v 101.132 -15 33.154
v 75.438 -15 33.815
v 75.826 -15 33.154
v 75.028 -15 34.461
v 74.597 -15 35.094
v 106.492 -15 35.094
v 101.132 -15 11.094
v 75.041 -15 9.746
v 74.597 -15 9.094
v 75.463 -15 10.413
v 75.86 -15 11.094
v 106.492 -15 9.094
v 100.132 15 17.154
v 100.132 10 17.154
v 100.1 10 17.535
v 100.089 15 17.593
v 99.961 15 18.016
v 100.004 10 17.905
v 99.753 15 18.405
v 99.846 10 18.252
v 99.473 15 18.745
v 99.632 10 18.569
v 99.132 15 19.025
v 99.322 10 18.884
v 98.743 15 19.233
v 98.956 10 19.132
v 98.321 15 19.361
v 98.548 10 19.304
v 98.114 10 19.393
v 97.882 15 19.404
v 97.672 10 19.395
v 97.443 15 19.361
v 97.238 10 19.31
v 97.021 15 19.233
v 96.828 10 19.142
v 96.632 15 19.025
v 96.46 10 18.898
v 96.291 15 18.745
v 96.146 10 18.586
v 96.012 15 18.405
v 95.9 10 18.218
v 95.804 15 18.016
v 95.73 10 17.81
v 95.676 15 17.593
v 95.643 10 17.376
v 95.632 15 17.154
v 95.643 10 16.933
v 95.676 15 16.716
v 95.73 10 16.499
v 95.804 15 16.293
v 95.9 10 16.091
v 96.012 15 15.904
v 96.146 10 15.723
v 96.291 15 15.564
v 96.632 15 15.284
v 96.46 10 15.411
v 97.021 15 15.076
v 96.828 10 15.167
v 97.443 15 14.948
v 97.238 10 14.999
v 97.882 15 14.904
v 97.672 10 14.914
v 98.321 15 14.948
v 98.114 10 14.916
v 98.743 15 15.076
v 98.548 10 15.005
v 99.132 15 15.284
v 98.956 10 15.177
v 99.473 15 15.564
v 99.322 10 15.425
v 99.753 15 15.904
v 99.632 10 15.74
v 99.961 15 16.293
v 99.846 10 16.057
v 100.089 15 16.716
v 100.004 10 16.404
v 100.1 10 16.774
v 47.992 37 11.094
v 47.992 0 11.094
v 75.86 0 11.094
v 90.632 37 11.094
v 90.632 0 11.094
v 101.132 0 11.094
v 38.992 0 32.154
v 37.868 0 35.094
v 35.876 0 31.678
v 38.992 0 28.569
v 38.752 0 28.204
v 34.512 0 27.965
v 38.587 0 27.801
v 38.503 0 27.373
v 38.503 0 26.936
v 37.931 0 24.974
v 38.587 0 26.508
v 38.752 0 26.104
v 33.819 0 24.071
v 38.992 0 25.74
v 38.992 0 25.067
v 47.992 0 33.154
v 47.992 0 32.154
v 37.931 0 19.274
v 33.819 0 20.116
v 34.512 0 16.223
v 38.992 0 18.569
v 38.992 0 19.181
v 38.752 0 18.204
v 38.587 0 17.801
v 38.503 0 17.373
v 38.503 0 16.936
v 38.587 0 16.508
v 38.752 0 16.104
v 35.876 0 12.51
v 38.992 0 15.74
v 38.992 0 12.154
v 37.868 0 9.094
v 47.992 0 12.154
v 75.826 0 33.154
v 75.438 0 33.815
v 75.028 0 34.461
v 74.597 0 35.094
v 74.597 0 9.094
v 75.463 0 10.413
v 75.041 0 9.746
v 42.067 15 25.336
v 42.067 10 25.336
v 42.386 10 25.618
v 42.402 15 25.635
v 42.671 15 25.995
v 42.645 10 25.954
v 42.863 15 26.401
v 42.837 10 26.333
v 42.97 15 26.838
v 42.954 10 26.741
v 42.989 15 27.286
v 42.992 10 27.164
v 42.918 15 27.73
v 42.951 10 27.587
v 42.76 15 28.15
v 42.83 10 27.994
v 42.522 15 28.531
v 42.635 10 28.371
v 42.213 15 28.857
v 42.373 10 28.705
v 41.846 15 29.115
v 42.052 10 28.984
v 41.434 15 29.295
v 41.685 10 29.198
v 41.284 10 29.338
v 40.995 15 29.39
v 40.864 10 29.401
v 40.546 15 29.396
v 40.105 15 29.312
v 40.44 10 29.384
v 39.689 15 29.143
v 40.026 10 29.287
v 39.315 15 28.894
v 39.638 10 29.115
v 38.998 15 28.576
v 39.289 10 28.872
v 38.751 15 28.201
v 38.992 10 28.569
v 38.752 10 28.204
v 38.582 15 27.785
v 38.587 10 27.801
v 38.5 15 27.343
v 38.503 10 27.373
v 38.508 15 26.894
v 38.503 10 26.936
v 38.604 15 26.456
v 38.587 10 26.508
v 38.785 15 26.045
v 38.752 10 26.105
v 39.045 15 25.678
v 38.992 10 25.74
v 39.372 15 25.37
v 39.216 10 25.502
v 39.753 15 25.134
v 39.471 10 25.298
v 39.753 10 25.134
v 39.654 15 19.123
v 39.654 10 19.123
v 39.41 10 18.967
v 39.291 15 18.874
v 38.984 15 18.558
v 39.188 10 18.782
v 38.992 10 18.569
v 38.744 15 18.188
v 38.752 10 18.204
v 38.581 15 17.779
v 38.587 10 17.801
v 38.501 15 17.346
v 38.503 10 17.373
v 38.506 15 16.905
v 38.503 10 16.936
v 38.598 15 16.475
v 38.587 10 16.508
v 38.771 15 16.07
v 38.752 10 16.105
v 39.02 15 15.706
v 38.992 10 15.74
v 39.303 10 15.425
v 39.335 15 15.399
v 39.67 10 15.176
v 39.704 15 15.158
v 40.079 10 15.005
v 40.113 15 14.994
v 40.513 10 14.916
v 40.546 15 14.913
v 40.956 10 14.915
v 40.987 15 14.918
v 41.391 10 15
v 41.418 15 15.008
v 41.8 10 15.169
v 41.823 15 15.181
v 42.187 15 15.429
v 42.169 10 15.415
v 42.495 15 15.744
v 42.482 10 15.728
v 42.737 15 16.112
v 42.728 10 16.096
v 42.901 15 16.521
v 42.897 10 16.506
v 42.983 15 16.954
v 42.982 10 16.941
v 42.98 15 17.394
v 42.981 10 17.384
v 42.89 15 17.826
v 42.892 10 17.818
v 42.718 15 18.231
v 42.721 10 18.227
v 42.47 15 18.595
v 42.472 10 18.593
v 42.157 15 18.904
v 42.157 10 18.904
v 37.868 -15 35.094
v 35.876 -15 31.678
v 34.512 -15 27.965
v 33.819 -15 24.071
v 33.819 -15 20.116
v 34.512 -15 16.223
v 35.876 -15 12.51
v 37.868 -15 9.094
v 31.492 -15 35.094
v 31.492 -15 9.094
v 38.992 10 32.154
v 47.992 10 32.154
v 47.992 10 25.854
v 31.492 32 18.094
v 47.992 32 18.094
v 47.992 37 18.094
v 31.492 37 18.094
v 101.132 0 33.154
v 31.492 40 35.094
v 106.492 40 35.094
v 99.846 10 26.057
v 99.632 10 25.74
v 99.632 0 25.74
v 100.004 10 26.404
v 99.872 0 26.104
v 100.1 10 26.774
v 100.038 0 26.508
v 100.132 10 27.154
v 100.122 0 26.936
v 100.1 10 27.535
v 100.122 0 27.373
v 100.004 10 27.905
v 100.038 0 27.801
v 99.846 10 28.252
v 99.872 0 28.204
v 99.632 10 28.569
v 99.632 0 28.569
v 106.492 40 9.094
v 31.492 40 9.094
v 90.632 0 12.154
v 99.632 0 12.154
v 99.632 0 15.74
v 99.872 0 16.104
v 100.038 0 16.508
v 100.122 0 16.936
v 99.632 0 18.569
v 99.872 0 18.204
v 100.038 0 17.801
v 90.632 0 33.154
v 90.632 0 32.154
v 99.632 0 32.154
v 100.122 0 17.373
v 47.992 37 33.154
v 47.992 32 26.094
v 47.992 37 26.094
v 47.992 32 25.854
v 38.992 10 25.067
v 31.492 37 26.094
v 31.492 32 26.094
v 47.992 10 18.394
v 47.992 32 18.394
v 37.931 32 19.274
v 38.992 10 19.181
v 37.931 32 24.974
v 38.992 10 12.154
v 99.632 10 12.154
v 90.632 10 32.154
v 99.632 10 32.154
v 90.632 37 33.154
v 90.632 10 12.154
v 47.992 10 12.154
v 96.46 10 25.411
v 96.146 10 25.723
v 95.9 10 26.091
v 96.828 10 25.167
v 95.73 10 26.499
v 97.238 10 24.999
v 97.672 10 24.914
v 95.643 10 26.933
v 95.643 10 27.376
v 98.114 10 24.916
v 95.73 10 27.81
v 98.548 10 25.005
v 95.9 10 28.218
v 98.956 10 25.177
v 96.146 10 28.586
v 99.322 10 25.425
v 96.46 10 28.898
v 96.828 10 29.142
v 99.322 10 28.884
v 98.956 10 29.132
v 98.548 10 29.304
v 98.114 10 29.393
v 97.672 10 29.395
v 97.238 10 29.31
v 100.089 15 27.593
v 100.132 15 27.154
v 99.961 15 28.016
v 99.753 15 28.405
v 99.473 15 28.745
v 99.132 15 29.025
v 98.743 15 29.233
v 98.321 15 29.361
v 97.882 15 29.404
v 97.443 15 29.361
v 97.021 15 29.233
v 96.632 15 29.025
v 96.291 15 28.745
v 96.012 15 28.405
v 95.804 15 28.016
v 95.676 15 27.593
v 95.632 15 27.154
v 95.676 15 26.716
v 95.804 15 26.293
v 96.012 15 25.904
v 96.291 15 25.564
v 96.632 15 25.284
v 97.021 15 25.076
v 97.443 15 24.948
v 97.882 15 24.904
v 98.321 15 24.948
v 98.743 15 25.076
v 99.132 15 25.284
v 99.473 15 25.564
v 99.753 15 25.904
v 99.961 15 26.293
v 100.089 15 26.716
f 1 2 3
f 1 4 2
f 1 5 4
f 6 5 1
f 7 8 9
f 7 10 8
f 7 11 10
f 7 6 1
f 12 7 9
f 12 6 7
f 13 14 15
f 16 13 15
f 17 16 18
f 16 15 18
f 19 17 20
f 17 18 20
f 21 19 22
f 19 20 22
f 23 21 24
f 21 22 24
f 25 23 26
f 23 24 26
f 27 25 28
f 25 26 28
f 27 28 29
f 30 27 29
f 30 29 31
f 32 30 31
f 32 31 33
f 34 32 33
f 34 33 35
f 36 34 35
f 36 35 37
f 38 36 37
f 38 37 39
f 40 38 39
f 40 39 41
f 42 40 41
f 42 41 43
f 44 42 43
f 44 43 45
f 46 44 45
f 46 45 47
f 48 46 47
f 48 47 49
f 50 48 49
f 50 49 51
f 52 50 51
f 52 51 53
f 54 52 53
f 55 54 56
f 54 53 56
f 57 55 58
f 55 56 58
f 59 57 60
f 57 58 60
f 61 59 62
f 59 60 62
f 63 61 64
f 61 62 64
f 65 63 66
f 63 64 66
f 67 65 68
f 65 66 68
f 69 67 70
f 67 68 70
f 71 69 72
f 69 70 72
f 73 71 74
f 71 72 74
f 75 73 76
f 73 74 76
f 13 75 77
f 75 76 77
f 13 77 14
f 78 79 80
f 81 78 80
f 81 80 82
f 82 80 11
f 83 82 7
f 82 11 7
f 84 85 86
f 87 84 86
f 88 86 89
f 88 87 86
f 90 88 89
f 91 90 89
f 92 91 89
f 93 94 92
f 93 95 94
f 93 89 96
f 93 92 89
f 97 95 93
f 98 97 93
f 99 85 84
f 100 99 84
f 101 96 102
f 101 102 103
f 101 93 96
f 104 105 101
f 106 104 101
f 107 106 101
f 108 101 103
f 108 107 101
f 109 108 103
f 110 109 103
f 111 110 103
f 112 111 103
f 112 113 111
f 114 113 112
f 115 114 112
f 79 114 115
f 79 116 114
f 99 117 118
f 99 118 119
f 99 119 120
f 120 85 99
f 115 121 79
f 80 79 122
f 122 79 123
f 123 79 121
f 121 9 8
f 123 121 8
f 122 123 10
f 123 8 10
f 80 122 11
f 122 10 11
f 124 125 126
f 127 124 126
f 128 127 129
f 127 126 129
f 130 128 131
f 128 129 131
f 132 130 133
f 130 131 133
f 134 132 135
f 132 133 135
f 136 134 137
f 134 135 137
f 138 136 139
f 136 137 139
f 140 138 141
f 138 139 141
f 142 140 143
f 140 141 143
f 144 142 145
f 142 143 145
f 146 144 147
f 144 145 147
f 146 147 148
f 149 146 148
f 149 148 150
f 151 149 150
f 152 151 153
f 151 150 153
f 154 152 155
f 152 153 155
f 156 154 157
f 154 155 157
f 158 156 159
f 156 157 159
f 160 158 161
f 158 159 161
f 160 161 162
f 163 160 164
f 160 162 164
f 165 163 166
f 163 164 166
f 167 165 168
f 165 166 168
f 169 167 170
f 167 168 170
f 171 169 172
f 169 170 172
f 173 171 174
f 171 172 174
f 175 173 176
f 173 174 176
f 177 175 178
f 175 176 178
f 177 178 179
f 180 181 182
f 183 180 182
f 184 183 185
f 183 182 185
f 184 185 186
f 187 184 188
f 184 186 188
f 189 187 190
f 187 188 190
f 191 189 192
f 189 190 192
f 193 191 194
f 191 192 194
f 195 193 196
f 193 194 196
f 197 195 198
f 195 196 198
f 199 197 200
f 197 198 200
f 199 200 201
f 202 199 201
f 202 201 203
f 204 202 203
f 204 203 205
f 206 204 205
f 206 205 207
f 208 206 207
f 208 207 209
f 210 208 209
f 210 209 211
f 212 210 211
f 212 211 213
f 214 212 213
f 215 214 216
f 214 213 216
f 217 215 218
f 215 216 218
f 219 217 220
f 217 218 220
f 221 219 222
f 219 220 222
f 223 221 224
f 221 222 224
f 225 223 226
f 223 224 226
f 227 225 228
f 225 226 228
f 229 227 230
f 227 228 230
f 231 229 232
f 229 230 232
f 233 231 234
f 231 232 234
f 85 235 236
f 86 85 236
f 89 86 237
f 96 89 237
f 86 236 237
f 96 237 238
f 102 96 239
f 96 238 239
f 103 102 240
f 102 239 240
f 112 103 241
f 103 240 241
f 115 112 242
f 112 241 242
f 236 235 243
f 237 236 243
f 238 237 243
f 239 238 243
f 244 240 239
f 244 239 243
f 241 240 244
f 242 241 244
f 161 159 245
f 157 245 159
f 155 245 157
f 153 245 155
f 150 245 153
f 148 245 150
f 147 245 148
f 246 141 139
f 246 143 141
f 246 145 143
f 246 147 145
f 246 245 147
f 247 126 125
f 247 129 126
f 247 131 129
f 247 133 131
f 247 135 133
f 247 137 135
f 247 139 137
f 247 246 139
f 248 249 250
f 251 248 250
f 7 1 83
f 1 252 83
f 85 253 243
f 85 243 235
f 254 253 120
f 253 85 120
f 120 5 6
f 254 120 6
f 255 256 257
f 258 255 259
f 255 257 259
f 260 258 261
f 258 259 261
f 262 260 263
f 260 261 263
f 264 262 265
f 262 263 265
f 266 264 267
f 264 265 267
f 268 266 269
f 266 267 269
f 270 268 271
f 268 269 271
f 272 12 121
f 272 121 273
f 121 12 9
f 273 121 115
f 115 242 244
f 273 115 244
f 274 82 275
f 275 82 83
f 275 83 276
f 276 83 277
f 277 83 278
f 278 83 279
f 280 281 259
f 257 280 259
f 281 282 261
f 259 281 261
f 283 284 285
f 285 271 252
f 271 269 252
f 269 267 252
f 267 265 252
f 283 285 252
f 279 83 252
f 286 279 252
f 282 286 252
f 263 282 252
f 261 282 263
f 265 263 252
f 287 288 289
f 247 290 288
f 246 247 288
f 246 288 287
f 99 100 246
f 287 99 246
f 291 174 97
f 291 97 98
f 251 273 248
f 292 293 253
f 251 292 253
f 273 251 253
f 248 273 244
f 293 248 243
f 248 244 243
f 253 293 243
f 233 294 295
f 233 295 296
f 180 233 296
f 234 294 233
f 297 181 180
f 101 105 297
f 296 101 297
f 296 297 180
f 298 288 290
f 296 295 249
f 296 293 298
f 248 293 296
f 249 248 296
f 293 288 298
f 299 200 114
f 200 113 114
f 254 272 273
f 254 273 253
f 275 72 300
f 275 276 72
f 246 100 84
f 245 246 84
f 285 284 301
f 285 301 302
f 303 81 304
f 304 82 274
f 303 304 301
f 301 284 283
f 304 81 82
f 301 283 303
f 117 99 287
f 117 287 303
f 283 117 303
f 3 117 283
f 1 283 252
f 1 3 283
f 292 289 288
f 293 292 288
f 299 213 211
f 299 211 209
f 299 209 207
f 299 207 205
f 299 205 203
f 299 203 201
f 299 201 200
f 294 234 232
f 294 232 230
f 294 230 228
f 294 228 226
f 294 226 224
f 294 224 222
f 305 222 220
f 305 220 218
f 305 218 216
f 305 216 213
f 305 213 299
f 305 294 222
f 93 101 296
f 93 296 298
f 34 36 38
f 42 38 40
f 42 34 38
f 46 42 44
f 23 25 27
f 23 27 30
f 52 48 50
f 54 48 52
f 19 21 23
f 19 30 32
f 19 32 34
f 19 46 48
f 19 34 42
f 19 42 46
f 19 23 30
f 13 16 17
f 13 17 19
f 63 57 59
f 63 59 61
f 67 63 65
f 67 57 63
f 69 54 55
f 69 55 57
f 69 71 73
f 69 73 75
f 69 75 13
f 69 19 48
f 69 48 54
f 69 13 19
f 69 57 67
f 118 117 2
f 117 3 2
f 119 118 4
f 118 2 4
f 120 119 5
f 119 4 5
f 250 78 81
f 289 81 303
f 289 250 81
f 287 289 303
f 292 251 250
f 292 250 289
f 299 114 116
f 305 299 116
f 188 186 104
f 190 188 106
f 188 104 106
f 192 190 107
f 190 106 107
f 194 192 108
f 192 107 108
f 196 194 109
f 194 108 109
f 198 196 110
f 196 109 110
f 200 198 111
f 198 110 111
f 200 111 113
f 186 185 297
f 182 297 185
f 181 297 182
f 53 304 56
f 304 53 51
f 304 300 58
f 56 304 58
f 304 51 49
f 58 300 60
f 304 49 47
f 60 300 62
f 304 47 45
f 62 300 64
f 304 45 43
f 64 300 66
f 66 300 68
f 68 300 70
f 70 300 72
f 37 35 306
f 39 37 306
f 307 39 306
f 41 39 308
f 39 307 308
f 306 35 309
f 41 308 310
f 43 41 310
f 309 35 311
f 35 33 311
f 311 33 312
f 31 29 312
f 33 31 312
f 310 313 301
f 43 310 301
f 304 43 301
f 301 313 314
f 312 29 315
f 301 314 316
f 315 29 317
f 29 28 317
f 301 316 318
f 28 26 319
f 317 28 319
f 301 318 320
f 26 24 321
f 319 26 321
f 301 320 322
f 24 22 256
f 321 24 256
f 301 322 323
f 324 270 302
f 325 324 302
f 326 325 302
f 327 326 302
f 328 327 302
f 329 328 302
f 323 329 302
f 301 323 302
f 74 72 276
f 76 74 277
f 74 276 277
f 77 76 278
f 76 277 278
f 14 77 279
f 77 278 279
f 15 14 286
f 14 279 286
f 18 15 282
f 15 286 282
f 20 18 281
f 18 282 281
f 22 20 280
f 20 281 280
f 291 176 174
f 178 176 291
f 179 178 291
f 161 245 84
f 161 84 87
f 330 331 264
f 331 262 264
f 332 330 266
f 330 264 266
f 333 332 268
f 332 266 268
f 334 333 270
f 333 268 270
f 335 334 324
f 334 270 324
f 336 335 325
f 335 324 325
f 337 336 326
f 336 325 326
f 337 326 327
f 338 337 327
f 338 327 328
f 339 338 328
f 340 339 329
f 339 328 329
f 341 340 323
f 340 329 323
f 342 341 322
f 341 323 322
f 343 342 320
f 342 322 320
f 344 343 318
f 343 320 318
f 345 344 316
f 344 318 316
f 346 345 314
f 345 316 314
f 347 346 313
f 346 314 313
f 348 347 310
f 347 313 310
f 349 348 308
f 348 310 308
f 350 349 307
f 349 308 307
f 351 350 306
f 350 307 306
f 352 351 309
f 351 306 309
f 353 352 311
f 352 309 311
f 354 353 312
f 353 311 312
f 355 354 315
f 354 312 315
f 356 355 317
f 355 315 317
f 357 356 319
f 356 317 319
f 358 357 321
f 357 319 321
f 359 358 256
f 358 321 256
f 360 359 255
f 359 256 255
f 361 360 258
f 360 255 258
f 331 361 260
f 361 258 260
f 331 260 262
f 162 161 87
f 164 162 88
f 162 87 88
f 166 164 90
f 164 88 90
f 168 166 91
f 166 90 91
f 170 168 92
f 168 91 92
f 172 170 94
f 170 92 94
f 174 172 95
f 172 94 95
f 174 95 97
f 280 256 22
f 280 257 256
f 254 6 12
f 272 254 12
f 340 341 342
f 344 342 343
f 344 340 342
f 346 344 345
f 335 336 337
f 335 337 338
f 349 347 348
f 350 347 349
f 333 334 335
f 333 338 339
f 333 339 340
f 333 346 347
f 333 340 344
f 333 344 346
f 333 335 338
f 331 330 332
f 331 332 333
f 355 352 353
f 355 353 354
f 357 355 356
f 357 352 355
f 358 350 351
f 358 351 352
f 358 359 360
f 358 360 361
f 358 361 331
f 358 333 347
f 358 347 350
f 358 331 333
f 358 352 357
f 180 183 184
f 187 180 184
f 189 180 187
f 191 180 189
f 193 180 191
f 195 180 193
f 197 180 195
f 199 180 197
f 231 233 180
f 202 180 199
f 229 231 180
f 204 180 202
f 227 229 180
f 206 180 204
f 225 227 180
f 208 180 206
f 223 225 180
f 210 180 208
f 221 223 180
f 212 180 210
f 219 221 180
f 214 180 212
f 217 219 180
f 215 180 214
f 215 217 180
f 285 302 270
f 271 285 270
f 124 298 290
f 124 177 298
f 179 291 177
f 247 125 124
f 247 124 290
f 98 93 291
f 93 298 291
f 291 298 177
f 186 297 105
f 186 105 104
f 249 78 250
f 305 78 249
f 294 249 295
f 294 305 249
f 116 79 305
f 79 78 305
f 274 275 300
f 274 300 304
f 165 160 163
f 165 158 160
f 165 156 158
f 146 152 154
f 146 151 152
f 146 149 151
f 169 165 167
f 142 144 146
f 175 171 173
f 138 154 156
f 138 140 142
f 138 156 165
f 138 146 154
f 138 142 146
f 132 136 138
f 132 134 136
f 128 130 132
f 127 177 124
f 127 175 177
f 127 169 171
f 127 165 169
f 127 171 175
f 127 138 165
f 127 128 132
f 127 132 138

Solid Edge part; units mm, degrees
sketch "Sketch1" plane through (0, 0, 0) normal (0, -1, 0) x (1, 0, 0)
  line L0 (31.4924, 35.0939) -> (106.4924, 35.0939)
  line L1 (106.4924, 35.0939) -> (106.4924, 9.0939)
  line L2 (106.4924, 9.0939) -> (31.4924, 9.0939)
  line L3 (31.4924, 9.0939) -> (31.4924, 35.0939)
  dimension "D1" = 75
  dimension "D2" = 26
extrude "Protrusion1" add sketch "Sketch1" against normal blind 40
sketch "Sketch2" plane through (64.4924, 0, 22.0939) normal (0, -1, 0) x (1, 0, 0)
  line L0 (-26.5616, 2.8803) -> (-16.5, 3.7605)
  line L1 (-16.5, 3.7605) -> (-16.5, 11.0605)
  line L2 (-16.5, 11.0605) -> (26.14, 11.0605)
  line L3 (26.14, -11) -> (26.14, 11.0605)
  line L4 (-16.5, -11) -> (26.14, -11)
  line L5 (-16.5, -11) -> (-16.5, -3.7)
  line L6 (-16.5, -3.7) -> (-26.5616, -2.8197)
  line L7 (-26.5616, -2.8197) -> (-26.5616, 2.8803)
extrude "ExtrudedCutout_4" cut sketch "Sketch2" against normal blind 37
sketch "Sketch3" plane through (31.4924, 20, 22.0939) normal (-1, 0, 0) x (0, -1, 0)
  line L0 (-17, -4) -> (-17, 4)
  line L1 (-17, 4) -> (-12, 4)
  line L2 (-12, 4) -> (-12, -4)
  line L3 (-12, -4) -> (-17, -4)
  dimension "D1" = 8
  dimension "D2" = 5
  dimension "D3" = 8
  dimension "D4" = 3
  dimension "D5" = 9
extrude "Cutout1" cut sketch "Sketch3" against normal up to next
sketch "Sketch4" plane through (64.4924, 0, 22.0939) normal (0, -1, 0) x (1, 0, 0)
  line L0 (-16.5, 10.0605) -> (-25.5, 10.0605)
  line L1 (-25.5, 10.0605) -> (-25.5, -9.9395)
  line L2 (-25.5, -9.9395) -> (-16.5, -9.9395)
  line L3 (-16.5, -9.9395) -> (-16.5, 10.0605)
  line L4 (26.14, 10.0605) -> (35.14, 10.0605)
  line L5 (35.14, 10.0605) -> (35.14, -9.9395)
  line L6 (35.14, -9.9395) -> (26.14, -9.9395)
  line L7 (26.14, -9.9395) -> (26.14, 10.0605)
  dimension "D1" = 1
  dimension "D2" = 20
  dimension "D3" = 1
  dimension "D4" = 9
  dimension "D5" = 20
  dimension "D6" = 9
extrude "ExtrudedCutout_6" cut sketch "Sketch4" against normal blind 10
sketch "Sketch5" plane through (91.2324, 10, 21.645) normal (0, -1, 0) x (1, 0, 0)
  circle A0 centre (6.65, 5.5095) radius 2.25
  circle A1 centre (-50.49, 5.5095) radius 2.25
  circle A2 centre (-50.49, -4.4905) radius 2.25
  circle A3 centre (6.65, -4.4905) radius 2.25
  dimension "D1" = 7.25
  dimension "D2" = 4.5
  dimension "D3" = 7.25
  dimension "D4" = 10
  dimension "D5" = 5
  dimension "D6" = 10
  dimension "D7" = 5
extrude "ExtrudedCutout_7" cut sketch "Sketch5" against normal blind 5
sketch "Sketch6" plane through (64.4924, 0, 22.0939) normal (0, -1, 0) x (1, 0, 0)
  circle A0 centre (33.39, 5.0605) radius 2.25
  circle A1 centre (33.39, -4.9395) radius 2.25
  circle A2 centre (-23.75, 5.0605) radius 2.25
  circle A3 centre (-23.75, -4.9395) radius 2.25
extrude "Cutout2" cut sketch "Sketch6" against normal up to next
sketch "Sketch7" plane through (68.9924, 0, 22.0939) normal (0, -1, 0) x (1, 0, 0)
  line L0 (-31.0616, 11.0605) -> (32.14, 11.0605)
  line L1 (32.14, 11.0605) -> (32.14, -11)
  line L2 (32.14, -11) -> (-31.0616, -11)
  line L3 (-31.0616, -11) -> (-31.0616, 11.0605)
  line L4 (-37.5, 13) -> (-37.5, -13)
  line L5 (-37.5, -13) -> (37.5, -13)
  line L6 (37.5, -13) -> (37.5, 13)
  line L7 (37.5, 13) -> (-37.5, 13)
  dimension "D1" = 1
extrude "ExtrudedProtrusion_4" add sketch "Sketch7" along normal blind 15
sketch "Sketch8" plane through (68.9924, -15, 22.0939) normal (0, -1, 0) x (1, 0, 0)
  circle A0 centre (-12.76, 0) radius 22.5
  dimension "D1" = 24.74
extrude "ExtrudedCutout_9" cut sketch "Sketch8" against normal blind 15
